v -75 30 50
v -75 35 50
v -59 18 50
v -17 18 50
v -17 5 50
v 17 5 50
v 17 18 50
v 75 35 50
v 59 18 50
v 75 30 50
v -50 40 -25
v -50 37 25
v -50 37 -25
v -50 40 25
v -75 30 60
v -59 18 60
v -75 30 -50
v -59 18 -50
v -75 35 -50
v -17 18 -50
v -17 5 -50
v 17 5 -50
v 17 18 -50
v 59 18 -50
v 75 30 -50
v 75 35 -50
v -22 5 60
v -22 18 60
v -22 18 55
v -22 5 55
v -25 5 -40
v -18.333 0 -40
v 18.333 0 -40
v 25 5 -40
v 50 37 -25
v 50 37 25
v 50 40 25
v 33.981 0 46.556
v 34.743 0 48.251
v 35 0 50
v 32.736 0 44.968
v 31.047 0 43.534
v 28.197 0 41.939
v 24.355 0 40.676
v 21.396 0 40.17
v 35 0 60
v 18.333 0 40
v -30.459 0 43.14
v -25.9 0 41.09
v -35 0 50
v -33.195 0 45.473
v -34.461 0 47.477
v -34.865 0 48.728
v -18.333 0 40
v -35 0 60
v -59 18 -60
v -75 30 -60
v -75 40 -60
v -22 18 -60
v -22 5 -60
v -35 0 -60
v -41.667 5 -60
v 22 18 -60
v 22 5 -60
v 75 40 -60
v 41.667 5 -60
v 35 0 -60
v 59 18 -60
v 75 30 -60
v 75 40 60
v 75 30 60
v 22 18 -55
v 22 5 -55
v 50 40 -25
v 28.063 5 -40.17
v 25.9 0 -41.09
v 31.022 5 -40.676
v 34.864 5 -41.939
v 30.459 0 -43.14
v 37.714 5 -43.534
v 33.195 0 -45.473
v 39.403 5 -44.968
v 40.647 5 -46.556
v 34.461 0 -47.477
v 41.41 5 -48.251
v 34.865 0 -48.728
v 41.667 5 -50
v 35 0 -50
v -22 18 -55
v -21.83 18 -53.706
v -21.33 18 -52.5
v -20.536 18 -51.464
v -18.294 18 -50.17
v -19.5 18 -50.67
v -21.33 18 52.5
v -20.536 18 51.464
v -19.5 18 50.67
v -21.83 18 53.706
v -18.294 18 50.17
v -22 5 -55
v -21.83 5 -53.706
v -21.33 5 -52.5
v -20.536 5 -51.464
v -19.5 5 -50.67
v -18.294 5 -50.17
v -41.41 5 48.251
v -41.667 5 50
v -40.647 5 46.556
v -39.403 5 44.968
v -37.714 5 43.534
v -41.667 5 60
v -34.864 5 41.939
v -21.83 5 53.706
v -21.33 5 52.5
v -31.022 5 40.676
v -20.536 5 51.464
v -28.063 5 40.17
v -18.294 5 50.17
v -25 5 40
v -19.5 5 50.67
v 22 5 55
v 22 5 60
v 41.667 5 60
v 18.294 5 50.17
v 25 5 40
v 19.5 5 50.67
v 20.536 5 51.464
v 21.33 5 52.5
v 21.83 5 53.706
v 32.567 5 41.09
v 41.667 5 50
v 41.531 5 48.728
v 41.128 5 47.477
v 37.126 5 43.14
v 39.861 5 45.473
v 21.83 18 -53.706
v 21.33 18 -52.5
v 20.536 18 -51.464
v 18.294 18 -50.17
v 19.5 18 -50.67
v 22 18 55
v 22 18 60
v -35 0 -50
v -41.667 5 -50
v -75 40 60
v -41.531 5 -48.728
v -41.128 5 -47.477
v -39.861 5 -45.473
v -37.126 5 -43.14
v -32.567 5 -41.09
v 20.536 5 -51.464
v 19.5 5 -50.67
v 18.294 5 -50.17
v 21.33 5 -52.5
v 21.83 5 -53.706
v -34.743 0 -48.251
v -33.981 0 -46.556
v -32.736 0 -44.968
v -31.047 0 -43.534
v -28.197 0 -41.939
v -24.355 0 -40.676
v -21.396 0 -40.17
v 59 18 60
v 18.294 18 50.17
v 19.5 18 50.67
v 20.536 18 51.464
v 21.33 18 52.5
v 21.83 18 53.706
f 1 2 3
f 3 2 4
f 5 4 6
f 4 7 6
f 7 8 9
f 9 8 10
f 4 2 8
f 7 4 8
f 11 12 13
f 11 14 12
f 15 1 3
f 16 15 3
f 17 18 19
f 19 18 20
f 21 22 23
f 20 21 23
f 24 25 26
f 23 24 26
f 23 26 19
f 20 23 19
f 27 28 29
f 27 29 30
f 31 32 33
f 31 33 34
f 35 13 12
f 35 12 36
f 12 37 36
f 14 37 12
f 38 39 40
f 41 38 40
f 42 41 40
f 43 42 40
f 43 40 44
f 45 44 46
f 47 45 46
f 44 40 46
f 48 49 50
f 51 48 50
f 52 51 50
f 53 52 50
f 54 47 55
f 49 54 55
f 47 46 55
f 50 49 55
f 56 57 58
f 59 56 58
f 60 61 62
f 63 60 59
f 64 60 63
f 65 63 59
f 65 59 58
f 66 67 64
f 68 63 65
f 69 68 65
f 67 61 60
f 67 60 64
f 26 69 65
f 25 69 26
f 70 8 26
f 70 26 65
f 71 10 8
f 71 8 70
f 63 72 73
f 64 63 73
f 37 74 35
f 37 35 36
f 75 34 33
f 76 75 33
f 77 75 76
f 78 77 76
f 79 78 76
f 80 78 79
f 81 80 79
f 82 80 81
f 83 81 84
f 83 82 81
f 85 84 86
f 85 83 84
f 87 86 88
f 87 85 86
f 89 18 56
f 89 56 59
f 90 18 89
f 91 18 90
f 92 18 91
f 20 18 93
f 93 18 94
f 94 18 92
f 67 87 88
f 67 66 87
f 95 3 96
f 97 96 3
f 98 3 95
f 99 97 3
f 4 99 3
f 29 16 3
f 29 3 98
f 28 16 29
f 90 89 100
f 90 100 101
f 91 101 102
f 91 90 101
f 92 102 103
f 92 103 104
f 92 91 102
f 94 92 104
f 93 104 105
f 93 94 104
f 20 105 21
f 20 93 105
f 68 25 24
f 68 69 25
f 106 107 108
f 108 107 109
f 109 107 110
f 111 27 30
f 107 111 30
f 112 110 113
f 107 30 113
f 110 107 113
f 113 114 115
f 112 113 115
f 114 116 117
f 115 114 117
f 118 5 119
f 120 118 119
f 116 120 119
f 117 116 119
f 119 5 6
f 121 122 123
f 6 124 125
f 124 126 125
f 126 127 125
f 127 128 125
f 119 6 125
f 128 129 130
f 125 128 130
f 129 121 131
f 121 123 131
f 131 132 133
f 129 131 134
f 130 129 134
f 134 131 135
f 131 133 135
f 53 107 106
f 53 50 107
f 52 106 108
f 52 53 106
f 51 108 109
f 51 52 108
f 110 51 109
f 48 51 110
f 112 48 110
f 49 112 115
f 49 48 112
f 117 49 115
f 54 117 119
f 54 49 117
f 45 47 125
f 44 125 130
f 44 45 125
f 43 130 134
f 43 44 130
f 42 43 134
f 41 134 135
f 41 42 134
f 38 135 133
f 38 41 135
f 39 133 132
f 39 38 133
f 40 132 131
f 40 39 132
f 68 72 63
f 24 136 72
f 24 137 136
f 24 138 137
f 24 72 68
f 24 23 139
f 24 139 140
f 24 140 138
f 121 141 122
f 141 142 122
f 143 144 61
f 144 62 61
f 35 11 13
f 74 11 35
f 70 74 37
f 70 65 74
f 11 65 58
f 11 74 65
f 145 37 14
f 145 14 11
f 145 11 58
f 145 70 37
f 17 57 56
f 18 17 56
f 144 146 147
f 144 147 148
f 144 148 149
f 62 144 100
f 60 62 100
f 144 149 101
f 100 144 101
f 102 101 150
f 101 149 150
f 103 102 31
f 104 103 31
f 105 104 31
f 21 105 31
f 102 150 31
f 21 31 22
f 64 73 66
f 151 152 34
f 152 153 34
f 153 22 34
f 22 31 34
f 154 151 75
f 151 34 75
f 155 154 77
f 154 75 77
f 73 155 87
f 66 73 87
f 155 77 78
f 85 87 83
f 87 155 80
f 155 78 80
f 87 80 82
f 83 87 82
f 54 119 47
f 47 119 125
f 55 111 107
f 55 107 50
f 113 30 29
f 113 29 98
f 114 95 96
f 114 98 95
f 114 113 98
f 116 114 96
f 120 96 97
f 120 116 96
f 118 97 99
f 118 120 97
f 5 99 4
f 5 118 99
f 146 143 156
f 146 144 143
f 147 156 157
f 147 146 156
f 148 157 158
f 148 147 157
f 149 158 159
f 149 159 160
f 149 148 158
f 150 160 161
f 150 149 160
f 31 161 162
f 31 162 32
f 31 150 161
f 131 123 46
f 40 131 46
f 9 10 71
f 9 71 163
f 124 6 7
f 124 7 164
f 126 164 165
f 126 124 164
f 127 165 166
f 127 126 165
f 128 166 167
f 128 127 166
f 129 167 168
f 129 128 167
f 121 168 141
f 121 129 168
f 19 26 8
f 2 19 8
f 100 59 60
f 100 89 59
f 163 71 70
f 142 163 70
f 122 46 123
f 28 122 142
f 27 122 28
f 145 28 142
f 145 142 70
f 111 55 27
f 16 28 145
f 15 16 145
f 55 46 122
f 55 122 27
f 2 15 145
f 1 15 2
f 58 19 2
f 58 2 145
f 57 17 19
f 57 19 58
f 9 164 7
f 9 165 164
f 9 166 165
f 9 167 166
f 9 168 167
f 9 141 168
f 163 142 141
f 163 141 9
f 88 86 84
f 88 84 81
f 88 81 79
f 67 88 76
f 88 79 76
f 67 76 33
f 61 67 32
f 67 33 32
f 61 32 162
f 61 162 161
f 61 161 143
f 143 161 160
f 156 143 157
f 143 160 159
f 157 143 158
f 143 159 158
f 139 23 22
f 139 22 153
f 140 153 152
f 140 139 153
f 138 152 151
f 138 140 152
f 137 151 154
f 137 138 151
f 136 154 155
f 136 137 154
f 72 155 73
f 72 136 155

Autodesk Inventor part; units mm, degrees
ref_plane "YZ Plane" through (0, 0, 0) normal (1, 0, 0) x (0, 1, 0)
ref_plane "XZ Plane" through (0, 0, 0) normal (0, 1, 0) x (-1, 0, 0)
ref_plane "XY Plane" through (0, 0, 0) normal (0, 0, 1) x (1, 0, 0)
sketch "Sketch1" plane through (0, 0, 0) normal (0, 1, 0) x (-1, 0, 0)
  line L0 (75, -60) -> (-75, -60)
  line L1 (-75, -60) -> (-75, 60)
  line L2 (-75, 60) -> (75, 60)
  line L3 (75, 60) -> (75, -60)
  line L4 (75, -60) -> (-75, 60) construction
  line L5 (-75, -60) -> (75, 60) construction
  point P0 (0, 0)
  dimension "d0" = 120
  dimension "d1" = 150
extrude "Extrusion1" add sketch "Sketch1" along normal blind 40
sketch "Sketch2" plane through (75, 0, 60) normal (1, 0, 0) x (0, 0, -1)
  line L0 (60, 0) -> (60, 40)
  line L1 (110, 35) -> (10, 35)
  line L2 (10, 35) -> (10, 5)
  line L3 (10, 5) -> (110, 5)
  line L4 (110, 5) -> (110, 35)
  line L5 (110, 35) -> (10, 5) construction
  line L6 (10, 35) -> (110, 5) construction
  line L7 (0, 40) -> (120, 40) projected
  point P0 (60, 20)
  dimension "d4" = 100
  dimension "d5" = 30
  dimension "d6" = 5
extrude "Extrusion2" cut sketch "Sketch2" against normal through all
sketch "Sketch3" plane through (75, 0, 60) normal (1, 0, 0) x (0, 0, -1)
  line L0 (60, 0) -> (60, 5)
  line L1 (110, 5) -> (10, 5) projected
  line L2 (100, 10) -> (20, 10)
  line L3 (20, 10) -> (20, -5)
  line L4 (20, -5) -> (100, -5)
  line L5 (100, -5) -> (100, 10)
  line L6 (100, 10) -> (20, -5) construction
  line L7 (20, 10) -> (100, -5) construction
  point P0 (60, 2.5)
  point P1 (100, 5)
  point P2 (20, 5)
  point P3 (110, 5)
  point P4 (0, 5)
  point P5 (100, 15)
  dimension "d9" = 80
extrude "Extrusion3" cut sketch "Sketch3" against normal through all
sketch "Sketch4" plane through (0, 40, 0) normal (0, 1, 0) x (1, 0, 0)
  line L0 (-50, 25) -> (50, 25)
  line L1 (50, 25) -> (50, -25)
  line L2 (50, -25) -> (-50, -25)
  line L3 (-50, -25) -> (-50, 25)
  line L4 (-50, 25) -> (50, -25) construction
  line L5 (50, 25) -> (-50, -25) construction
  point P0 (0, 0)
  dimension "d12" = 50
  dimension "d13" = 100
extrude "Extrusion4" cut sketch "Sketch4" against normal blind 3
sketch "Sketch5" plane through (75, 0, -60) normal (0, 0, -1) x (-1, 0, 0)
  line L0 (0, 0) -> (150, 0) projected
  line L1 (150, 0) -> (150, 40) projected
  line L2 (0, 40) -> (150, 40) projected
  line L3 (0, 0) -> (0, 40) projected
  line L4 (150, 0) -> (0, 0) construction
  line L5 (150, 0) -> (0, 40) construction
  line L6 (0, 0) -> (0, 40) construction
  line L7 (0, 0) -> (150, 40) construction
  line L8 (75, 20) -> (75, 40) construction
  line L9 (0, 40) -> (40, 40)
  line L10 (40, 0) -> (0, 0)
  line L11 (0, 0) -> (0, 40)
  line L12 (150, 0) -> (150, 40)
  line L13 (0, 30) -> (40, 30)
  line L14 (40, 30) -> (40, 0)
  line L15 (40, 0) -> (0, 0)
  line L16 (0, 0) -> (0, 30)
  line L17 (0, 30) -> (40, 0)
  line L18 (150, 30) -> (110, 30)
  line L19 (110, 30) -> (110, 0)
  line L20 (150, 30) -> (110, 0)
  point P0 (75, 0)
  point P1 (150, 30)
  point P2 (110, 0)
  point P3 (110, 0)
  dimension "d20" = 30
  dimension "d21" = 70
extrude "Extrusion5" cut sketch "Sketch5" against normal through all contours L3 L17 L0 | L20 L1 L0
sketch "Sketch6" plane through (-75, 40, 60) normal (0, 0, 1) x (1, 0, 0)
  line L0 (0, 0) -> (150, 0) projected
  line L1 (150, -10) -> (150, 0) projected
  line L2 (0, 0) -> (150, 0) projected
  line L3 (0, -10) -> (0, 0) projected
  line L4 (0, -10) -> (40, -40) projected
  line L5 (33.3333, -35) -> (116.6667, -35)
  line L6 (40, -40) -> (0, -10) projected
  line L7 (16, -22) -> (134, -22)
  line L8 (150, -10) -> (110, -40) projected
  line L9 (53, -22) -> (53, -35)
  line L10 (150, -35) -> (33.3333, -35) projected
  line L11 (75, -40) -> (75, 0)
  line L12 (25, 0) -> (125, 0) construction
  line L13 (97, -22) -> (97, -35)
  line L14 (0, -10) -> (40, -40) projected
  line L15 (40, -40) -> (110, -40) projected
  line L16 (110, -40) -> (150, -10) projected
  point P0 (97, -22)
  point P1 (97, -35)
  point P2 (16, -22)
  dimension "d22" = 13
  dimension "d24" = 22
extrude "Extrusion6" cut sketch "Sketch6" against normal through all contours L7 L9 L5 L4 | L7 L8 L5 L13
fillet "Fillet1" radius 5 4 edges at (22, 11.5, 50) (-22, 11.5, 50) (-22, 11.5, -50) (22, 11.5, -50)
fillet "Fillet2" radius 10 4 edges at (38.3333, 2.5, 40) (-38.3333, 2.5, 40) (-38.3333, 2.5, -40) (38.3333, 2.5, -40)
properties part number "Battery Cage"
